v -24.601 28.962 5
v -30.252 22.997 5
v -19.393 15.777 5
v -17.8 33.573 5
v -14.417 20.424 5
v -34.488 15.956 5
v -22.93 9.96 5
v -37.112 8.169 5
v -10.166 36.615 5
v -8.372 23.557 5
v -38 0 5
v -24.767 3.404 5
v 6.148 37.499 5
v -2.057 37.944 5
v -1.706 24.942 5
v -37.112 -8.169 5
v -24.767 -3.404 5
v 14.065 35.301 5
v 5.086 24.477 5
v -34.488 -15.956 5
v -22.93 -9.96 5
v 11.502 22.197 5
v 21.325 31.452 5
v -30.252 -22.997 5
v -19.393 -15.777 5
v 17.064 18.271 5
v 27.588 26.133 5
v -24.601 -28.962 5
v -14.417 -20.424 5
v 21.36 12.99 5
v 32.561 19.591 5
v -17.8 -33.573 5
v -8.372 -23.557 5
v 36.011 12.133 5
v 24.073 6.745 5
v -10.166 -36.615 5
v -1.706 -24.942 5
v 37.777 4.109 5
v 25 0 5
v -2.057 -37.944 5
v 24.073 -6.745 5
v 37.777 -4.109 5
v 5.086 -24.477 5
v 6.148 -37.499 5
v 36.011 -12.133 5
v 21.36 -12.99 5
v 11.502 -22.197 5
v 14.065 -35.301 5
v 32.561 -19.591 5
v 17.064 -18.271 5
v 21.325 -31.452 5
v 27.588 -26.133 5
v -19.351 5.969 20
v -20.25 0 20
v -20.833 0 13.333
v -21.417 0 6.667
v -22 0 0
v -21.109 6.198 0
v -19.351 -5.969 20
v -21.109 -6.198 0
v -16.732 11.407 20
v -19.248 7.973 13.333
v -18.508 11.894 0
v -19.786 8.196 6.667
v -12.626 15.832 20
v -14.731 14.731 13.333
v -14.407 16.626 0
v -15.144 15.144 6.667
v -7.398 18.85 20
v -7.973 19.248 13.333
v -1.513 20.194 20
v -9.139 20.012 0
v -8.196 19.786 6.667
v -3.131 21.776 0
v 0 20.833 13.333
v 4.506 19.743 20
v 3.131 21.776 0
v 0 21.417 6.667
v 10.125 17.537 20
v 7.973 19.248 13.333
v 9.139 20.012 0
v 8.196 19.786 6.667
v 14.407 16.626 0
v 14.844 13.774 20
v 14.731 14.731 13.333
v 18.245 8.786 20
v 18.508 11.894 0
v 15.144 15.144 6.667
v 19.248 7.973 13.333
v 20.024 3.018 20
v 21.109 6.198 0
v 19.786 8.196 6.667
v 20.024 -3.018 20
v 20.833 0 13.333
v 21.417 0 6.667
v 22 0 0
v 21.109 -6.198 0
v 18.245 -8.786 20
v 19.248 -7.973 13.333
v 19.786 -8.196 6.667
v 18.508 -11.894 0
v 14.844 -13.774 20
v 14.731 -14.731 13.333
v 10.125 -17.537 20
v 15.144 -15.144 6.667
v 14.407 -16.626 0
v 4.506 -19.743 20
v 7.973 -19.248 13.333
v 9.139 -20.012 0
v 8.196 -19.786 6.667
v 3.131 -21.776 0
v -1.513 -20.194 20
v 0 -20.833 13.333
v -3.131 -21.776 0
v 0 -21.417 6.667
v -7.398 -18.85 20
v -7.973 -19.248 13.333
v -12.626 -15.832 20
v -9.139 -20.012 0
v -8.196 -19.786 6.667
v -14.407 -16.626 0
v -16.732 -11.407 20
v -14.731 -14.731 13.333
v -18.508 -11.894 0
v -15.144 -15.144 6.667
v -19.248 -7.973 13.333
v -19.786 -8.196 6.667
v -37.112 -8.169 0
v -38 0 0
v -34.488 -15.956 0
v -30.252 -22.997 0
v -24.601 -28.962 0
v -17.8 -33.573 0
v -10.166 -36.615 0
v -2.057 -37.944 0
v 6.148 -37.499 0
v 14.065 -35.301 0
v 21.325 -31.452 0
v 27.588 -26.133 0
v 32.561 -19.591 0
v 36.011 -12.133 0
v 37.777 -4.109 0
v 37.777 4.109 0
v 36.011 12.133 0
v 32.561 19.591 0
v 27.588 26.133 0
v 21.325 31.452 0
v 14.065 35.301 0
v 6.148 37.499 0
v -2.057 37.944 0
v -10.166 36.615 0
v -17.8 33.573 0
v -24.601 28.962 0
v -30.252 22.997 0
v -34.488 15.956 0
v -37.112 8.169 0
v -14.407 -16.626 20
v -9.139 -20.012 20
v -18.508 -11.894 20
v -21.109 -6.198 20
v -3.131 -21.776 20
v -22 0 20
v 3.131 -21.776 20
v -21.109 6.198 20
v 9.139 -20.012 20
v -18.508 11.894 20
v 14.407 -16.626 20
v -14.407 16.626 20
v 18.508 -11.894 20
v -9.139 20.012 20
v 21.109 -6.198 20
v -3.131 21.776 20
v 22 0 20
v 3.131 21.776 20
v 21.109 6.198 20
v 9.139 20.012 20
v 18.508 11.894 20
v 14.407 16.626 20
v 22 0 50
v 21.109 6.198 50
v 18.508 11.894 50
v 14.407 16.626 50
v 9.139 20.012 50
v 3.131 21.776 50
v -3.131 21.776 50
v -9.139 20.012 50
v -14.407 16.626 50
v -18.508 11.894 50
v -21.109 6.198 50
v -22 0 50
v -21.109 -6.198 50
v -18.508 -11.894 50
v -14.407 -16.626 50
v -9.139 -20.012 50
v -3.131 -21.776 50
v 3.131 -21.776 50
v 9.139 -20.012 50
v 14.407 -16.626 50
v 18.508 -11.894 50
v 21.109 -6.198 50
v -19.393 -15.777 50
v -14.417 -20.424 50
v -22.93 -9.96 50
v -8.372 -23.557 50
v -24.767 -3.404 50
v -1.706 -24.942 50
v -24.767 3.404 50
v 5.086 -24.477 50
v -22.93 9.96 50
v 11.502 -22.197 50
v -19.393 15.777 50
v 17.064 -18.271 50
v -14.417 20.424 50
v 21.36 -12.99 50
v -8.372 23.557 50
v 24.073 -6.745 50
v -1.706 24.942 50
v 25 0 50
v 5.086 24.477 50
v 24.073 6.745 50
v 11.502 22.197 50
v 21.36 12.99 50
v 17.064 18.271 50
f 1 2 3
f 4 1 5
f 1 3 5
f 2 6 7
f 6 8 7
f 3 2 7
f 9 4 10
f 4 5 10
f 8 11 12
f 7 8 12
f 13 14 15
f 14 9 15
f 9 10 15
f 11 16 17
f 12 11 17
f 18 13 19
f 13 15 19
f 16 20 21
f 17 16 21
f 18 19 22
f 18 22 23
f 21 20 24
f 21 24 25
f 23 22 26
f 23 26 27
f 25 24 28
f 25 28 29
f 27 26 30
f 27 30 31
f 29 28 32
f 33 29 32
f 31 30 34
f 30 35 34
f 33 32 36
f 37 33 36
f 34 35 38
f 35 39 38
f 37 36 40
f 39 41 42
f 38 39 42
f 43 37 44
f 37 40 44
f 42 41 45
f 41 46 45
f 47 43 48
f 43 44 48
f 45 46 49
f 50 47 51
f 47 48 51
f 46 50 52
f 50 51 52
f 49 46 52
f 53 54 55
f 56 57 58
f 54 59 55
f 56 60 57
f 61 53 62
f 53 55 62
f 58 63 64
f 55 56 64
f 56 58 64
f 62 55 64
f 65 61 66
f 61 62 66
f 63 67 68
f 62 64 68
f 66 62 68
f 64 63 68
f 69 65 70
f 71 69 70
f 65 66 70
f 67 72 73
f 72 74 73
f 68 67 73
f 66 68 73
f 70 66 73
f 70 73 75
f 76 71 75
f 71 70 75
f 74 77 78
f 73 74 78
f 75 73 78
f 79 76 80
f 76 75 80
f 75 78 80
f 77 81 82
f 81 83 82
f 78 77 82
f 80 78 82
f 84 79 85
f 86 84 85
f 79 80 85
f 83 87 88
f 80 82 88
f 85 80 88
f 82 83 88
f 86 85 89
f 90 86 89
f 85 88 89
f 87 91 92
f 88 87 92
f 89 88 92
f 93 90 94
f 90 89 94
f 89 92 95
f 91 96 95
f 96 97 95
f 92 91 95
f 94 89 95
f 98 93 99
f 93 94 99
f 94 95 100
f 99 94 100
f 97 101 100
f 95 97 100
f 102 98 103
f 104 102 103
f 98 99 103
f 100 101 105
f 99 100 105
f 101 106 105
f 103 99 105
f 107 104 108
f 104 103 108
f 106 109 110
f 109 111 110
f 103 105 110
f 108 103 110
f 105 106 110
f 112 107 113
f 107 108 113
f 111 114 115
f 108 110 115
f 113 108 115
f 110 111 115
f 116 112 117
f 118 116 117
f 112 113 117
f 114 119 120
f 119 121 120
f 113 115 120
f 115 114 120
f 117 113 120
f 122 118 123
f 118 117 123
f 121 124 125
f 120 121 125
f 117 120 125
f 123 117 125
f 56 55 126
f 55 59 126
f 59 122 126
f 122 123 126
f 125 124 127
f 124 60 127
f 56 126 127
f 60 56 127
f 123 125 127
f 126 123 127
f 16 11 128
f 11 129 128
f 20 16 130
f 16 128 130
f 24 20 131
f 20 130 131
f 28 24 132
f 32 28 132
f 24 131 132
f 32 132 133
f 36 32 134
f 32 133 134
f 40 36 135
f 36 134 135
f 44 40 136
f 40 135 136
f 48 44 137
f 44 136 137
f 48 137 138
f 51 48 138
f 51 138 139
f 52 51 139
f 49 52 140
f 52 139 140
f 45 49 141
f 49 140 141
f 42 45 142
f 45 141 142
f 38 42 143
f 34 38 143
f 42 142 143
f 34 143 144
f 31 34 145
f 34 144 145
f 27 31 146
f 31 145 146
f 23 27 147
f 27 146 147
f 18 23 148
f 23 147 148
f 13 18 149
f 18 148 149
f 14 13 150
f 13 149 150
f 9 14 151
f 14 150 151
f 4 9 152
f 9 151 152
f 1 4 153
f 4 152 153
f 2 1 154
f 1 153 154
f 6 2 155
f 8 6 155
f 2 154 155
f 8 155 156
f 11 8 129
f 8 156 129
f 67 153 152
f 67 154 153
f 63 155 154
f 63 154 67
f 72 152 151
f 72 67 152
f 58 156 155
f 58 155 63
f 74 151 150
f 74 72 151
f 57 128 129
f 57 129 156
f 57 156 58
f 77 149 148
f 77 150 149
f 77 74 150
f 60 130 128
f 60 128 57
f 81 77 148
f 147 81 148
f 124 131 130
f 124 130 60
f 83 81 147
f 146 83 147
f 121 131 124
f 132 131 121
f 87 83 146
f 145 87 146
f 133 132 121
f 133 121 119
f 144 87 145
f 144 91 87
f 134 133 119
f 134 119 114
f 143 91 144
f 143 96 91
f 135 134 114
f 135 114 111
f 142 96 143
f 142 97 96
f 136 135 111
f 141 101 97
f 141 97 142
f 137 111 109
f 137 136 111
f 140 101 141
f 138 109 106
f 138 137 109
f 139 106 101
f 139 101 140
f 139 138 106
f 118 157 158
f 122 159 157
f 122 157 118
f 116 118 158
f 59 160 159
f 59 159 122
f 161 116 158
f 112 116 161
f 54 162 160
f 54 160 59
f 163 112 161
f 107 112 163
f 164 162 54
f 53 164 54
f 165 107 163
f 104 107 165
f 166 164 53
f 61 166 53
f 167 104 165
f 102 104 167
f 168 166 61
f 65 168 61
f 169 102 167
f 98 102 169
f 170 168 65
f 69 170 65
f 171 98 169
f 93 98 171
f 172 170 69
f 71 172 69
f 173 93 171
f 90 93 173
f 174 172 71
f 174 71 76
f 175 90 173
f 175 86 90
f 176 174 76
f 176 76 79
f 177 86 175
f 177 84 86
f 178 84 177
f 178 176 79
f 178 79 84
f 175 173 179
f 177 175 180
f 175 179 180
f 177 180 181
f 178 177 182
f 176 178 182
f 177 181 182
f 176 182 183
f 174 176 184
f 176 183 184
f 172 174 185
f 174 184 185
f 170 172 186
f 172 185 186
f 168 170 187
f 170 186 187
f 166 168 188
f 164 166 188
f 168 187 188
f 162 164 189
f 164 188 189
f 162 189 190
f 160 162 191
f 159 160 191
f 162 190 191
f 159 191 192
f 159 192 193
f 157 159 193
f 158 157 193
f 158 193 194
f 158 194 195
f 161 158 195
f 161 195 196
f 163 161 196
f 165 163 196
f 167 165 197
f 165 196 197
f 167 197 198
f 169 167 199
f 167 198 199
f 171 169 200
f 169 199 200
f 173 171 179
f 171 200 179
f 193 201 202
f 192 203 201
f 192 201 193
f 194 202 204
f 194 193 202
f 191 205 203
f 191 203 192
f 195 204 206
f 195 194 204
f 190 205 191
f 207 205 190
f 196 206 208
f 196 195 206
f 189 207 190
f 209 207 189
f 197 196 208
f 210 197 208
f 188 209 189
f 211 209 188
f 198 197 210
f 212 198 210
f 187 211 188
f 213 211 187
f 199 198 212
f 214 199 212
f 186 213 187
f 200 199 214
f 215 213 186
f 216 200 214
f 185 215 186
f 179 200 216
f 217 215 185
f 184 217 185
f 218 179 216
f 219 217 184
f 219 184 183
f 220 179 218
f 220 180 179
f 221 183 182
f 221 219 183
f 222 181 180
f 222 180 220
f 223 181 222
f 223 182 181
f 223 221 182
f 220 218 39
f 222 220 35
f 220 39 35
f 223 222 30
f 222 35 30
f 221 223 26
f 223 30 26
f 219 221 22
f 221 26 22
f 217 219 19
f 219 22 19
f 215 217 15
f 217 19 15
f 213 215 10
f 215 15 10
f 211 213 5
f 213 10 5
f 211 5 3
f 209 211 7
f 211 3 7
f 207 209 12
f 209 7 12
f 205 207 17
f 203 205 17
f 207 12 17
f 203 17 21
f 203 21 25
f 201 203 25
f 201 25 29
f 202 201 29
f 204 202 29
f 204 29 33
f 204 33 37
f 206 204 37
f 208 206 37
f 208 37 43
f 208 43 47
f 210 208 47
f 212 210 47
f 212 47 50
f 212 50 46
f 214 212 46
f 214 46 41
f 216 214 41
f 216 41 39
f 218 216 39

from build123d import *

# Parameters (mm, degrees)
SKETCH1_R           = 25
BOSS_EXTRUDE1_DEPTH = 50
SKETCH4_W           = 5
SKETCH4_H           = 13
SKETCH2_R           = 22
CUT_EXTRUDE1_DEPTH  = 74.402997214
CUT_EXTRUDE1_DRAFT  = -5
SKETCH3_R           = 22
CUT_EXTRUDE2_DEPTH  = 30


with BuildPart() as part:
    # Sketch1 → Boss-Extrude1 (new body)
    with BuildSketch(Plane.XY):
        Circle(SKETCH1_R)
    extrude(amount=BOSS_EXTRUDE1_DEPTH)

    # Sketch4 → Revolve1 (revolve)
    with BuildSketch(Plane(origin=(0, 0, 0), x_dir=(0, 0, -1), z_dir=(1, 0, 0)), mode=Mode.PRIVATE) as revolve1_sk:
        with Locations((-2.5, 31.5)):
            Rectangle(SKETCH4_W, SKETCH4_H)
    revolve(revolve1_sk.sketch.rotate(Axis((0, 0, -2.5), (0, 0, 1)), 90), axis=Axis((0, 0, -2.5), (0, 0, 1)))


with BuildPart() as cut_extrude1_tool:
    # Sketch2 → Cut-Extrude1 (with draft: the straight prism first)
    with BuildSketch(Plane(origin=(0, 0, 0), x_dir=(-1, 0, 0), z_dir=(0, 0, -1))):
        Circle(SKETCH2_R)
    extrude(amount=-CUT_EXTRUDE1_DEPTH)
    # Cut-Extrude1: the draft: its side faces are tilted about the plane it starts from
    cut_extrude1_sides = [cut_extrude1_tool.faces().sort_by_distance(p)[0] for p in [
        (22, 0, 37.201498607),
    ]]
    draft(cut_extrude1_sides, Plane(origin=(0, 0, 0), x_dir=(-1, 0, 0), z_dir=(0, 0, -1)), CUT_EXTRUDE1_DRAFT)


with BuildPart() as part_1:
    add(part.part)

    # Cut-Extrude1: cut by cut_extrude1_tool
    add(cut_extrude1_tool.part, mode=Mode.SUBTRACT)

    # Sketch3 → Cut-Extrude2 (cut)
    with BuildSketch(Plane.XY.offset(50)):
        Circle(SKETCH3_R)
    extrude(amount=-CUT_EXTRUDE2_DEPTH, mode=Mode.SUBTRACT)


solid = part_1.part
